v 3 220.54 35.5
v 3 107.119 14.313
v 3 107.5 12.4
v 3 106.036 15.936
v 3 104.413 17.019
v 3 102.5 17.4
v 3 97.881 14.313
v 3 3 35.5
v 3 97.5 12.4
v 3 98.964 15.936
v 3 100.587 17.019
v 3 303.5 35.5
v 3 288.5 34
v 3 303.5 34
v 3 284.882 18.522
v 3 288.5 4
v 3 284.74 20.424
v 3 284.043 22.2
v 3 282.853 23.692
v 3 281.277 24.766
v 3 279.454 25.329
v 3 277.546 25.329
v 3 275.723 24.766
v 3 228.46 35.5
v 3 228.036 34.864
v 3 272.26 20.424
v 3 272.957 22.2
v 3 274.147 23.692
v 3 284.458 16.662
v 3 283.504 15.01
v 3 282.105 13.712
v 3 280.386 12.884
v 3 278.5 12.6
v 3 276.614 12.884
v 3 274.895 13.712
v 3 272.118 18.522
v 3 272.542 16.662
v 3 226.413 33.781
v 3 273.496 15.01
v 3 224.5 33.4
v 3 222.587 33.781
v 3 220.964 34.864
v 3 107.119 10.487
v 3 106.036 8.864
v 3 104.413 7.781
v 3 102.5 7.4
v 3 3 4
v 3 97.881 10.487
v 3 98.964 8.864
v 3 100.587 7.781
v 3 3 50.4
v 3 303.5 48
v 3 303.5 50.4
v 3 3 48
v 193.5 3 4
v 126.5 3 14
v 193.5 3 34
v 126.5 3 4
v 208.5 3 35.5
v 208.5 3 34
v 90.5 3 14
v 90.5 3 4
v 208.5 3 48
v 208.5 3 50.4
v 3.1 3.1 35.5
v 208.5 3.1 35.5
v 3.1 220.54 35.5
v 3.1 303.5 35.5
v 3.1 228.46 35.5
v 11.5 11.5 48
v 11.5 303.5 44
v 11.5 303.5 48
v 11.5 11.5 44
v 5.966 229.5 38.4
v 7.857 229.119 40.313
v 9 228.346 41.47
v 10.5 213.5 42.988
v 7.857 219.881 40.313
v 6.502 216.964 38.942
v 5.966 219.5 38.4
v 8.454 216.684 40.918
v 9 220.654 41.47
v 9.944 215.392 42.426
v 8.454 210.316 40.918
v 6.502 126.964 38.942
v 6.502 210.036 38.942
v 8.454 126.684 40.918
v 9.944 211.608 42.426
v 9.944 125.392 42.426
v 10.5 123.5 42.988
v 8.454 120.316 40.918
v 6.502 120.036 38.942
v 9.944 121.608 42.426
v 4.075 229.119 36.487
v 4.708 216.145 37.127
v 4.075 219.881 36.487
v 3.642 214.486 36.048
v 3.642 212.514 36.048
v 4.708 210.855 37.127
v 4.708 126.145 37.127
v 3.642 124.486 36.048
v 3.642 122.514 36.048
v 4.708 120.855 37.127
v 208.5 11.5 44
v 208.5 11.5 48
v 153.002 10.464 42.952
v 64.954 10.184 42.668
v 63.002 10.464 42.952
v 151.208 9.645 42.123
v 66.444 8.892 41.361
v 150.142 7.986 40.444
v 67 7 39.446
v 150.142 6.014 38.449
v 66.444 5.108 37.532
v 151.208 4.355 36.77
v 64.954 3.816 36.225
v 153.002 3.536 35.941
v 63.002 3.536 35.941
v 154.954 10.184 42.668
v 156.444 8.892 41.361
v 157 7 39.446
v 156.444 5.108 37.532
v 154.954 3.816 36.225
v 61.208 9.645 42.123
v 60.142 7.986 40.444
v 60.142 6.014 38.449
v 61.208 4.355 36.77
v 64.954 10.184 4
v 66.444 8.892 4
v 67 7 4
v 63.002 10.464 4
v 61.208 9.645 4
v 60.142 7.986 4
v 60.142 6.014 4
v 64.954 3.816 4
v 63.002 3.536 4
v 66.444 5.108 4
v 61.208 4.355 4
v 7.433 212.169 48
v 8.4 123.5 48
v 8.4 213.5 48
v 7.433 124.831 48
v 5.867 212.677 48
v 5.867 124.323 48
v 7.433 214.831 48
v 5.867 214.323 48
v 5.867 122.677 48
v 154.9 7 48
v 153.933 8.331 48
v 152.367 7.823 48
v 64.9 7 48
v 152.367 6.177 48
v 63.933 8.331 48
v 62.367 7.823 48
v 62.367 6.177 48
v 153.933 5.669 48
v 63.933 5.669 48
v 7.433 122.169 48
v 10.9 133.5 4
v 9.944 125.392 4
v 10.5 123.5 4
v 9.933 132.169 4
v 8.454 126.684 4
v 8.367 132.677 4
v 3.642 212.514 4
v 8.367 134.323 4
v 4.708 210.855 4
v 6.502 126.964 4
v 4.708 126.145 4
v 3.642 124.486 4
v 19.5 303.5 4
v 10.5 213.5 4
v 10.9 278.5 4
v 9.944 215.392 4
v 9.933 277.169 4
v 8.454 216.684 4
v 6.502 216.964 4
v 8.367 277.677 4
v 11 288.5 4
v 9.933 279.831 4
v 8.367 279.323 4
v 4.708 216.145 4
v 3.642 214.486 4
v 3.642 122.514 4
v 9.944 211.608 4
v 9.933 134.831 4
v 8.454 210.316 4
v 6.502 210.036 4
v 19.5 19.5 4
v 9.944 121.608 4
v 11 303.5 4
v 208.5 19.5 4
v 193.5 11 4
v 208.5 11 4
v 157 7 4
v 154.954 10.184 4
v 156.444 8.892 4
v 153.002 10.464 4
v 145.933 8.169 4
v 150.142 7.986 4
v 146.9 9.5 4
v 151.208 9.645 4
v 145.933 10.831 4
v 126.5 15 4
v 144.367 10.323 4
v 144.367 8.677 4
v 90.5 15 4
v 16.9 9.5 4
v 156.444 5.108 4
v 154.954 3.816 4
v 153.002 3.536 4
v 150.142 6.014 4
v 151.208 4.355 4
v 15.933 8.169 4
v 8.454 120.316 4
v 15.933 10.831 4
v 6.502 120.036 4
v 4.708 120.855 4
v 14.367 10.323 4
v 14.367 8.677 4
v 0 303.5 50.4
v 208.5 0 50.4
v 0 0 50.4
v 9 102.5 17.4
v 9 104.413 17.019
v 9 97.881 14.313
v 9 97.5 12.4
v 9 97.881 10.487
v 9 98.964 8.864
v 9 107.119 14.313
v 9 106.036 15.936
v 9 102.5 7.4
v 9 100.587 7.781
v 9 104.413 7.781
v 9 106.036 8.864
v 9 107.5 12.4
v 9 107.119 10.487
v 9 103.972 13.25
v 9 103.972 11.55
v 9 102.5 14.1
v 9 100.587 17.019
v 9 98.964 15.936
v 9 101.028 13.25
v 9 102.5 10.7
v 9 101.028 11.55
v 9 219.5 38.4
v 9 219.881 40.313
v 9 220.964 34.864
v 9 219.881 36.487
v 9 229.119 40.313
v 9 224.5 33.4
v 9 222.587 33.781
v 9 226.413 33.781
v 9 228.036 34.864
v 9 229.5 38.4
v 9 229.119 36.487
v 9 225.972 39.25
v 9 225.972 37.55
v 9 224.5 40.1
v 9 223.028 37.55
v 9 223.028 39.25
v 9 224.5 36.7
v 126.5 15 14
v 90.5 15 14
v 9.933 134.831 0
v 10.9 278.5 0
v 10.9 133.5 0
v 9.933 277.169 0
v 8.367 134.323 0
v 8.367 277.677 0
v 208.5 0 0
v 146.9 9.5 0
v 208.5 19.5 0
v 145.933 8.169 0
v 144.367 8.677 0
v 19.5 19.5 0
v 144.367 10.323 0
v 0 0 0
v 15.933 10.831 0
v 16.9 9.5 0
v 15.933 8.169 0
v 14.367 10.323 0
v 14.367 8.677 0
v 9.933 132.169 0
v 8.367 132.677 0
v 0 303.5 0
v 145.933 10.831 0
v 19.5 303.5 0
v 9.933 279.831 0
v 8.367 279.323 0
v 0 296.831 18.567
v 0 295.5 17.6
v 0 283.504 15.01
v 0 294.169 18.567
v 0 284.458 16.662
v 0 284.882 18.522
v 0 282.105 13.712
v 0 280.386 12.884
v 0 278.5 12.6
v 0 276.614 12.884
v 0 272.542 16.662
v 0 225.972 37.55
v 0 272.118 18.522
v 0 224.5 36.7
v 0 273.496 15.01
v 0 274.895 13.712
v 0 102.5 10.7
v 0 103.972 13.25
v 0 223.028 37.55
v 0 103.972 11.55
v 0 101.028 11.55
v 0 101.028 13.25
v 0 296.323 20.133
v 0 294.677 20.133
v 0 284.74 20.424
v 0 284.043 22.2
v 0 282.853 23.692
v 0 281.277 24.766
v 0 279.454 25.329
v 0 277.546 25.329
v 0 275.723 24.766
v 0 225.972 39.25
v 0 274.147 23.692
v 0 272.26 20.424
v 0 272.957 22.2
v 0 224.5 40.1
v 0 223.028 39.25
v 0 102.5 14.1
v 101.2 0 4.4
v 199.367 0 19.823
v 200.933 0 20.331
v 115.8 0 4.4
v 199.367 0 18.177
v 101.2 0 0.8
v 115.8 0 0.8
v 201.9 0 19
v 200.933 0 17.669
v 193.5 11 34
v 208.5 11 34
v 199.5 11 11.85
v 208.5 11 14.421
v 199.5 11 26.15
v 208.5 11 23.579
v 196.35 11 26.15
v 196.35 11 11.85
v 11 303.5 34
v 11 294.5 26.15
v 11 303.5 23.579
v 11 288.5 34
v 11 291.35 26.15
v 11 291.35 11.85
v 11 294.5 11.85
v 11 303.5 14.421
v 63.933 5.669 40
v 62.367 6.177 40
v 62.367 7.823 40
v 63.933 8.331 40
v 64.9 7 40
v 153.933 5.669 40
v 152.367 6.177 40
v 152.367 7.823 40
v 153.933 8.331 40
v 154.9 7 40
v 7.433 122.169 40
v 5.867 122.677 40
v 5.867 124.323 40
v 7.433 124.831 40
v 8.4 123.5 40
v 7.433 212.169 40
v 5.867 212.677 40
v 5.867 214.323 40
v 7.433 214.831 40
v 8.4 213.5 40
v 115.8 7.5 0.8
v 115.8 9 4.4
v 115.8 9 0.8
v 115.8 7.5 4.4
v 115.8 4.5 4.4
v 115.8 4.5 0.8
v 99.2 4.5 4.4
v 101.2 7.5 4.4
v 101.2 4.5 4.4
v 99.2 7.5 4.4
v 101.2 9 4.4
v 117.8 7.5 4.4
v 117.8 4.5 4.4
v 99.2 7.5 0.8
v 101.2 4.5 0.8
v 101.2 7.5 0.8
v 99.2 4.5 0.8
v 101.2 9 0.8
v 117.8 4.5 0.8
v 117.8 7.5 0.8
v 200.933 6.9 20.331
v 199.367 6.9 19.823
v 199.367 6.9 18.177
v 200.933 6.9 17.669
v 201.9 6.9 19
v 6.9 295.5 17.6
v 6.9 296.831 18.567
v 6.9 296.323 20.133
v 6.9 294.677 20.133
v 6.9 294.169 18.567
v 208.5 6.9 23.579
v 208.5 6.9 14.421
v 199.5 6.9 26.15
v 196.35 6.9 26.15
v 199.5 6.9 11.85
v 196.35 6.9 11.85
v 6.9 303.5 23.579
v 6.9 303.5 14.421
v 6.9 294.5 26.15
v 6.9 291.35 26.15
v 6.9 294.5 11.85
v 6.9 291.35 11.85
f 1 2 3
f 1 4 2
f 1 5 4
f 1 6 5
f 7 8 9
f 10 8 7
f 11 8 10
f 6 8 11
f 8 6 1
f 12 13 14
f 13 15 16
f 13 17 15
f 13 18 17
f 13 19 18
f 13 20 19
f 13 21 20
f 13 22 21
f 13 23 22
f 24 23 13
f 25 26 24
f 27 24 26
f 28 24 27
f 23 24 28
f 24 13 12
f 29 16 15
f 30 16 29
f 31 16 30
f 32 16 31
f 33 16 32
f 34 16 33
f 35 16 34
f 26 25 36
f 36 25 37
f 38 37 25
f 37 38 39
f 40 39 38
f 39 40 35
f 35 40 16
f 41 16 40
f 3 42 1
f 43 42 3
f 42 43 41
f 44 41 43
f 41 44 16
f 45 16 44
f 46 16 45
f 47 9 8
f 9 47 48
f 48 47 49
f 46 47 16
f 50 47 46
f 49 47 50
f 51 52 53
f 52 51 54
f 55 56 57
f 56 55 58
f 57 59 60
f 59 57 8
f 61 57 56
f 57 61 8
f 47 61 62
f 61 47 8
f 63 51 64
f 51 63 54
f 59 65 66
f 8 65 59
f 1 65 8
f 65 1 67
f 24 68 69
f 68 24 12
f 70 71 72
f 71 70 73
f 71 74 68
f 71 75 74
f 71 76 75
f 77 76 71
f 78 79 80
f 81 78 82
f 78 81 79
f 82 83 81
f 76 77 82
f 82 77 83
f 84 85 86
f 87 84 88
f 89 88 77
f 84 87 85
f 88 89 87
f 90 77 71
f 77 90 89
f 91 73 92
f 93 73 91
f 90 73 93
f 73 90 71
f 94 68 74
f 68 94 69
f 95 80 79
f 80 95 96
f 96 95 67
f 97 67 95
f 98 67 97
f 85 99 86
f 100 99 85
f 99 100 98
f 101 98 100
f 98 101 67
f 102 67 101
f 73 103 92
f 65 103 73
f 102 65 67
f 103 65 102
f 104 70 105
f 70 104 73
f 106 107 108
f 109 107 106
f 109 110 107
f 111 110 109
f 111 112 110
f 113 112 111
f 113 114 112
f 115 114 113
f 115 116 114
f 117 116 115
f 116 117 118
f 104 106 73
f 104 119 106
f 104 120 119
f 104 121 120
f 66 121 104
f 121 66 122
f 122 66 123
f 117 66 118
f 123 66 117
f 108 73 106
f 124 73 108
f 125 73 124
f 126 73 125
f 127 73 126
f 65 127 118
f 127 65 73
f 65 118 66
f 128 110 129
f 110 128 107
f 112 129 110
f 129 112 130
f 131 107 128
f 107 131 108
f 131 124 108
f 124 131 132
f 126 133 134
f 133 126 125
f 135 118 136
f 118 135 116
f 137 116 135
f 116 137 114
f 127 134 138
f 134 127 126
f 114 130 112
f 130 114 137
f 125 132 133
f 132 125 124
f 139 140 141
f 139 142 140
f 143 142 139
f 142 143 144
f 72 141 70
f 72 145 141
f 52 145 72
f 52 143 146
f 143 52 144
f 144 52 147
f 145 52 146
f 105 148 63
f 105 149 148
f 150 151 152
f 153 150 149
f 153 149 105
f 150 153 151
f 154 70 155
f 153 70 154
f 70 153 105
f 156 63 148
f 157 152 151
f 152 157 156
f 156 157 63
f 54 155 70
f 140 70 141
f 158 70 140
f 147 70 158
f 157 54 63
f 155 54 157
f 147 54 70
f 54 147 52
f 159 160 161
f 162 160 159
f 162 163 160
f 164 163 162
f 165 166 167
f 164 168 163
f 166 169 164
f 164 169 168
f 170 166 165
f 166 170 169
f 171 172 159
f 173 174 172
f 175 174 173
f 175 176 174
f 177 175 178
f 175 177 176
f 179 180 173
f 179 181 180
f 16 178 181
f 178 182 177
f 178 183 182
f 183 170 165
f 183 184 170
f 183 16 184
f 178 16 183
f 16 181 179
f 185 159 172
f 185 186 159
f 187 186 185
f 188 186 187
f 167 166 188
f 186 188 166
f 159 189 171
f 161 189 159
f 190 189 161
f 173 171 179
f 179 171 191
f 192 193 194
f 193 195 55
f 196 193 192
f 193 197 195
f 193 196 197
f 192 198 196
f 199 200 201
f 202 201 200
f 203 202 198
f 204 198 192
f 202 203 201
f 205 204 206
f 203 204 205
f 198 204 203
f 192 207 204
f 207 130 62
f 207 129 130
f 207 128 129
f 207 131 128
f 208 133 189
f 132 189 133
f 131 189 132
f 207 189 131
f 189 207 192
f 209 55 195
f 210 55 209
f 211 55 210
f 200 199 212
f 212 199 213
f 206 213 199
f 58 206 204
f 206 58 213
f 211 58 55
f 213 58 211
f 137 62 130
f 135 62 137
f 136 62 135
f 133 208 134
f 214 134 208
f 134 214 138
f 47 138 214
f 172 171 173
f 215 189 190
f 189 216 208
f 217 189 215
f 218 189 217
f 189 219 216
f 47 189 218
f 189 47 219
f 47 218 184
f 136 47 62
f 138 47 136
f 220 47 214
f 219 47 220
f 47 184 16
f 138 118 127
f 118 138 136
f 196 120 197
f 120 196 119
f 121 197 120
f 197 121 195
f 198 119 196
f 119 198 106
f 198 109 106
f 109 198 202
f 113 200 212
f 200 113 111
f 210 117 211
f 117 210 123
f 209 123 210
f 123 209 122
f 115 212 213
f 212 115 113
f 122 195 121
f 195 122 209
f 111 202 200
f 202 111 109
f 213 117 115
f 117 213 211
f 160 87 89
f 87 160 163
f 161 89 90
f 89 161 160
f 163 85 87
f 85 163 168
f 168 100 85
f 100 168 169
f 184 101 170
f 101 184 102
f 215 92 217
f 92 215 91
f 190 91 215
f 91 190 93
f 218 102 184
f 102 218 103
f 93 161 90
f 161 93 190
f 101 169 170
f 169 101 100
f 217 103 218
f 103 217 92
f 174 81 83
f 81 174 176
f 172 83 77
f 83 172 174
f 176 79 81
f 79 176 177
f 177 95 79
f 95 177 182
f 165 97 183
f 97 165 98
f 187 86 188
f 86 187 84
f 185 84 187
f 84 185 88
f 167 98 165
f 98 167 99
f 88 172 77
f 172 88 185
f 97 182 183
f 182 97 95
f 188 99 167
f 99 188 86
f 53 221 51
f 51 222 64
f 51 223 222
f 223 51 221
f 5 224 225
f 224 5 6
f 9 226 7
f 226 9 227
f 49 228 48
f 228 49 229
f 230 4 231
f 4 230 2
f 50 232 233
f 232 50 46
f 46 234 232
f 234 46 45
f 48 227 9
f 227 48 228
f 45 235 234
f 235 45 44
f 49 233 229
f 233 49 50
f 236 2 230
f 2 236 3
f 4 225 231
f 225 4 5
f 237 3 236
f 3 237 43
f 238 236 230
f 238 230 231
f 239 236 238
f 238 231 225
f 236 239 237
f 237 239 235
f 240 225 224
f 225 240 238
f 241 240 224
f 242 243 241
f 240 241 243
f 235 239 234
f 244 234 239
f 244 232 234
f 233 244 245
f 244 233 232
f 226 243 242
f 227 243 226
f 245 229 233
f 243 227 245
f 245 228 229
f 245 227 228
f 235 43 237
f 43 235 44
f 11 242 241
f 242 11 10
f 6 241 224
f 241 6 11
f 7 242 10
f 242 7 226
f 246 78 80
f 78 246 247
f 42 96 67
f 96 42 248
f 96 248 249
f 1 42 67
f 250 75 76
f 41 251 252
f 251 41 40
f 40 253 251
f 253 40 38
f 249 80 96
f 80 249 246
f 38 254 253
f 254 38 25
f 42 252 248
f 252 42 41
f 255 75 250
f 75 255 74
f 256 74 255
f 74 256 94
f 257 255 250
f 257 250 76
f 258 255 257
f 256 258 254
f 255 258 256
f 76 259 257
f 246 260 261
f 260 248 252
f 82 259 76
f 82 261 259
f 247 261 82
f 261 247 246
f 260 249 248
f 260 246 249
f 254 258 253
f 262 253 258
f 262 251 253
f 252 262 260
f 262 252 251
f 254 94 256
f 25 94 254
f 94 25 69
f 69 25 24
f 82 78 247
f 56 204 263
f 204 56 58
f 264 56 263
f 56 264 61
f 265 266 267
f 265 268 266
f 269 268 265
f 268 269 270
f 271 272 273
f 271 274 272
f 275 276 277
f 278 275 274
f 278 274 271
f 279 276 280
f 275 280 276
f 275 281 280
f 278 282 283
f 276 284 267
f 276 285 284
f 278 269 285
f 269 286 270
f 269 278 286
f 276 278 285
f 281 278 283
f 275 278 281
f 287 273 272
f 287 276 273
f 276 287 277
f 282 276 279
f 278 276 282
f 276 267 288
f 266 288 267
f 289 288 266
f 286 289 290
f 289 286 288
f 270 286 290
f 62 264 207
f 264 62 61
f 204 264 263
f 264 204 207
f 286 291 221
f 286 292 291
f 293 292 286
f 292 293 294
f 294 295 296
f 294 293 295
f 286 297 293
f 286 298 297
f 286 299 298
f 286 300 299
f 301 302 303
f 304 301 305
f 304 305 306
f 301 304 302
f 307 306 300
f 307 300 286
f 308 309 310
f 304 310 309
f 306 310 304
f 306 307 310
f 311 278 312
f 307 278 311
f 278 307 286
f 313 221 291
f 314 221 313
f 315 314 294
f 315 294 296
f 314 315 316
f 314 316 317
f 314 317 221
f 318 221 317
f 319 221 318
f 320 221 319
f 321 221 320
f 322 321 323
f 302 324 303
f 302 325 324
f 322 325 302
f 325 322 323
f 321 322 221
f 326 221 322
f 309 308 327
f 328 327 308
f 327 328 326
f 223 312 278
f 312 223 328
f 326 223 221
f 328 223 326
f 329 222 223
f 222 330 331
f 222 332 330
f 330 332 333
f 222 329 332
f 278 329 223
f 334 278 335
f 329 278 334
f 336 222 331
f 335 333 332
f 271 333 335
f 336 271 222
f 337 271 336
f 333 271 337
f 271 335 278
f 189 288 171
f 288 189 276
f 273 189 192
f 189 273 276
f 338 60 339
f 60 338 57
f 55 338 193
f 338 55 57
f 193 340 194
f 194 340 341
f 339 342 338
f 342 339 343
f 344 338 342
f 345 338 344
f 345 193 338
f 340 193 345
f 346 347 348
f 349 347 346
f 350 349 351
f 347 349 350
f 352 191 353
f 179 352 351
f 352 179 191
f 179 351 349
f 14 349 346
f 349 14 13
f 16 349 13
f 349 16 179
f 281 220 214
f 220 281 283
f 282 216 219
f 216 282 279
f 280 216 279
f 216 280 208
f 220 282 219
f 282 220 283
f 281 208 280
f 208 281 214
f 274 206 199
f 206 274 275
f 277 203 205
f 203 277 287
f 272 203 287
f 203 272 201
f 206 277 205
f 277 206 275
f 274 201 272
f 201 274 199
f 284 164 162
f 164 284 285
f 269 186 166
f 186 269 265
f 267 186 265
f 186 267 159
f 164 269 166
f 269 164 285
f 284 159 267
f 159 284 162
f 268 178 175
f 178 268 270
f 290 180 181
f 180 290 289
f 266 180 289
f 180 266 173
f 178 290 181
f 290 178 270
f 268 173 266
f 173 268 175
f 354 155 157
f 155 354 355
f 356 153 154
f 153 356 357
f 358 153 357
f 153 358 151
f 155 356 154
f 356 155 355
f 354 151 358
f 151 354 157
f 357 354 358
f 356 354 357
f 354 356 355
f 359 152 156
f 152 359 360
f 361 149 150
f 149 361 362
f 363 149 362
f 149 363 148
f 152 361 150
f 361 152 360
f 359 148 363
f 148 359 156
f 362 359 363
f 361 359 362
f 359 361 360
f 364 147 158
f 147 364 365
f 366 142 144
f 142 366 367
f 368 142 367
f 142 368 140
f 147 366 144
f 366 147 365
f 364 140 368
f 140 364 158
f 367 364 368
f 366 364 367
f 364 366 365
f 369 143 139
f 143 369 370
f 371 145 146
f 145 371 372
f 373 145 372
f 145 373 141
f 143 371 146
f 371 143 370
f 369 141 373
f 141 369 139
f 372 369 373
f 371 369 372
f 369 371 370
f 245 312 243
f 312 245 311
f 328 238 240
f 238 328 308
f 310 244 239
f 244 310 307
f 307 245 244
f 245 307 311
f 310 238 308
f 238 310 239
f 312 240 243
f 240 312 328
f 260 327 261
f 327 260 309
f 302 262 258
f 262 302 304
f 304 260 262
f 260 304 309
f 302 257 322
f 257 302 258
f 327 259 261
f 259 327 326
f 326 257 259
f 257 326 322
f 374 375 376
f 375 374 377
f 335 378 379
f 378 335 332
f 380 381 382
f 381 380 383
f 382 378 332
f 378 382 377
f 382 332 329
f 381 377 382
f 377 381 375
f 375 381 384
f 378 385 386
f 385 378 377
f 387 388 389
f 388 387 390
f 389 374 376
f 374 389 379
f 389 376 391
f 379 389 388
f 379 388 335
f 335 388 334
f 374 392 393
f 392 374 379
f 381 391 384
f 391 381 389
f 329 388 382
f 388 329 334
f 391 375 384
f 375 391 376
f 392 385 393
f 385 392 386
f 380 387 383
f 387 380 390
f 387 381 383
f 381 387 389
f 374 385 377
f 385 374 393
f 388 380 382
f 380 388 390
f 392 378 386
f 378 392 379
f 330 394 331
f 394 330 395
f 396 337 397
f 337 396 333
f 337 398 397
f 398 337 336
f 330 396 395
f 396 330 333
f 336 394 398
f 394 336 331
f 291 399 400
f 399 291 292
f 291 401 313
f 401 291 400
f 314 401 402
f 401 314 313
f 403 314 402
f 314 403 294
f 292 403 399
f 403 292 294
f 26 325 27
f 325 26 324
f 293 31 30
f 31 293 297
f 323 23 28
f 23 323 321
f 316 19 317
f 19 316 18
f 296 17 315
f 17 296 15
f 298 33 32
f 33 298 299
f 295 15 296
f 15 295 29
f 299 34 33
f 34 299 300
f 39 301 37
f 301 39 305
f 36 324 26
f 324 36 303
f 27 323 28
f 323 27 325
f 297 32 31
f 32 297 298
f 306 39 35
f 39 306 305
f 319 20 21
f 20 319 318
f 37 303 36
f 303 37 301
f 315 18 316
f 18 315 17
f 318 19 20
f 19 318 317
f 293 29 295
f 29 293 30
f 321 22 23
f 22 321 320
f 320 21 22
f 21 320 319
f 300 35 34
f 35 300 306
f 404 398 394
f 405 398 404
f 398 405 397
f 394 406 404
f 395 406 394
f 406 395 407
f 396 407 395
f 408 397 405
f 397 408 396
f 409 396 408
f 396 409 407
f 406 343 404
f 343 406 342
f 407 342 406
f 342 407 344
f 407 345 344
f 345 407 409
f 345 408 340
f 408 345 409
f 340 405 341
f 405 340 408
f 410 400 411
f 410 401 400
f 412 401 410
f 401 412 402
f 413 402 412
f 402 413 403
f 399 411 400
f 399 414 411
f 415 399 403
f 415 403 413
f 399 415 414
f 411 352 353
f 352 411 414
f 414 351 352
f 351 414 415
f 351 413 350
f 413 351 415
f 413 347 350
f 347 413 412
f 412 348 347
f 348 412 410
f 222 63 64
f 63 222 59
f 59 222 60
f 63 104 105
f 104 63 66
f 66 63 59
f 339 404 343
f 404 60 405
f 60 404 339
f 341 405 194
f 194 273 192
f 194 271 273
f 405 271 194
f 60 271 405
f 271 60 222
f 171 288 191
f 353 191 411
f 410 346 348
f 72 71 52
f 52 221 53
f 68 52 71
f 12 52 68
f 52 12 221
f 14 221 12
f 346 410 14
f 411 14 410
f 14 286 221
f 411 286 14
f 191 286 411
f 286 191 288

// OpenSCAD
// file: frame_layout.scad
// AUTO-GENERATED by tools/boltframe.py — backer frame layout
// Board coords, z=0 at plate BACK, +z into the cavity.
fr_face=[410.0,550.0]; fr_clr=0.5; fr_wall=3.0; fr_cavity=48.0;
fr_panel_t=2.4; fr_flange_w=16.0; fr_flange_t=4.0;
fr_ledge_w=8.0; fr_ledge_t=4.0; fr_reveal=2.0;
fr_joint=[205.0,300.0];
fr_boss=[[12.00,6.00],[142.00,6.00],[272.00,6.00],[398.00,6.00],[12.00,544.00],[142.00,544.00],[272.00,544.00],[398.00,544.00],[6.00,130.00],[6.00,275.00],[6.00,420.00],[404.00,130.00],[404.00,275.00],[404.00,420.00]];
fr_panels=[[0.0,0.0,205.0,300.0],[205.0,0.0,410.0,300.0],[0.0,300.0,205.0,550.0],[205.0,300.0,410.0,550.0]];
fr_panel_scr=[[[60.00,3.50],[150.00,3.50],[3.50,120.00],[3.50,210.00],[131.50,60.00],[131.50,130.00],[174.50,60.00],[174.50,130.00],[40.00,255.00]],[[260.00,3.50],[350.00,3.50],[406.50,120.00],[406.50,210.00],[280.00,255.00],[370.00,255.00]],[[60.00,546.50],[150.00,546.50],[3.50,340.00],[3.50,395.00],[104.50,330.00],[104.50,470.00],[147.50,330.00],[147.50,470.00]],[[220.00,546.50],[260.00,546.50],[350.00,546.50],[406.50,340.00],[406.50,470.00],[406.50,530.00]]];
fr_ledge_boss=[[60.00,3.50],[150.00,3.50],[260.00,3.50],[350.00,3.50],[60.00,546.50],[150.00,546.50],[220.00,546.50],[260.00,546.50],[350.00,546.50],[3.50,120.00],[3.50,210.00],[3.50,340.00],[3.50,395.00],[406.50,120.00],[406.50,210.00],[406.50,340.00],[406.50,470.00],[406.50,530.00]];
fr_rail_boss=[[104.50,330.00],[104.50,470.00],[147.50,330.00],[147.50,470.00],[131.50,60.00],[131.50,130.00],[174.50,60.00],[174.50,130.00]];
fr_leg=[[40.00,255.00],[280.00,255.00],[370.00,255.00]];
fr_tray_psu=[1.0,407.0,98.0,536.0];
fr_psu_holes=[[35.00,485.00],[68.00,485.00]];
fr_psu_slots=[[41.50,427.50,46.50,427.50],[41.50,482.50,46.50,482.50]];
fr_tray_ctl=[342.0,405.0,392.0,534.0];
fr_ctl_holes=[[354.00,408.50],[380.00,530.50]];
fr_ctl_ext=[[99.00,12.40],[221.00,38.40]];
fr_gland=[275.0,19.0];
fr_gland_plate=0;
fr_trim=0;
fr_handle=[[60.0,150.0,65.0,145.0],[260.0,350.0,265.0,345.0]];
fr_feet=[105.0,305.0];
fr_vent_intake=[14, 23, 32, 41, 50];
fr_vent_exhaust=[500, 509, 518, 527, 536];
fr_mic=[367.0,470.0];
// main file
// Backer-frame corner-L rail segments (spec 2026-07-21). WHITE PETG.
//   openscad -D SEG=<1|2|3|4> -o frame_segN.stl src/parts/frame.scad
//   SEG: 1=bottom-left 2=bottom-right 3=top-right 4=top-left
// Board coords, z=0 = plate BACK, +z into the cavity. Prints FLANGE-DOWN
// (flange + tray floors on the bed); the 2 mm reveal is a snap-on trim
// strip (frame_parts PART=6), not part of this body.
include <frame_layout.scad>

SEG = 1;

ox0 = -fr_clr - fr_wall;  ox1 = fr_face[0] + fr_clr + fr_wall;
oy0 = -fr_clr - fr_wall;  oy1 = fr_face[1] + fr_clr + fr_wall;
inx0 = ox0 + fr_wall;  inx1 = ox1 - fr_wall;   // wall inner faces (-0.5 / +.5)
iny0 = oy0 + fr_wall;  iny1 = oy1 - fr_wall;
wz1 = fr_cavity + fr_panel_t;            // wall top (38.4) = panel back plane
lz0 = fr_cavity - fr_ledge_t;            // ledge underside (32)
chw = fr_ledge_w + fr_clr;               // chamfer reach inboard of the wall

module oring(w) difference() {           // perimeter band, width w inboard
    translate([ox0, oy0]) square([ox1 - ox0, oy1 - oy0]);
    translate([ox0 + w, oy0 + w]) square([ox1 - ox0 - 2*w, oy1 - oy0 - 2*w]);
}

// 45-degree support wedge under the ledge ring (per side, corners overlap):
// hull of a hairline strip on the wall inner face (z lz0-chw) and the
// ledge-width strip at the ledge underside (z lz0)
module ledge_chamfer() {
    hull() {  // left
        translate([inx0, iny0, lz0 - chw]) cube([0.1, iny1 - iny0, 0.1]);
        translate([inx0, iny0, lz0]) cube([chw, iny1 - iny0, 0.1]);
    }
    hull() {  // right
        translate([inx1 - 0.1, iny0, lz0 - chw]) cube([0.1, iny1 - iny0, 0.1]);
        translate([inx1 - chw, iny0, lz0]) cube([chw, iny1 - iny0, 0.1]);
    }
    hull() {  // bottom
        translate([inx0, iny0, lz0 - chw]) cube([inx1 - inx0, 0.1, 0.1]);
        translate([inx0, iny0, lz0]) cube([inx1 - inx0, chw, 0.1]);
    }
    hull() {  // top
        translate([inx0, iny1 - 0.1, lz0 - chw]) cube([inx1 - inx0, 0.1, 0.1]);
        translate([inx0, iny1 - chw, lz0]) cube([inx1 - inx0, chw, 0.1]);
    }
}

module body() {
    linear_extrude(wz1) oring(fr_wall);                  // walls
    linear_extrude(fr_flange_t)
        oring(fr_wall + fr_clr + fr_flange_w);           // flange
    translate([0, 0, lz0]) linear_extrude(fr_ledge_t)
        oring(fr_wall + fr_clr + fr_ledge_w);            // panel ledge
    ledge_chamfer();
    // equipment tray floors (merge into wall + flange; z 0..flange_t)
    translate([inx0, fr_tray_psu[1], 0])
        cube([fr_tray_psu[2] - inx0, fr_tray_psu[3] - fr_tray_psu[1],
              fr_flange_t]);
    translate([fr_tray_ctl[0], fr_tray_ctl[1], 0])
        cube([inx1 - fr_tray_ctl[0], fr_tray_ctl[3] - fr_tray_ctl[1],
              fr_flange_t]);
    // ledge-boss columns (rise from flange to ledge, pilots cut later)
    for (q = fr_ledge_boss)
        translate([q[0], q[1], fr_flange_t])
            cylinder(h = fr_cavity - fr_flange_t, d = 7);
    // handle pads under the top face, gland pilot pads, exterior ctl pads
    for (h = fr_handle) for (bx = [h[2], h[3]])
        translate([bx - 10, iny1 - 12, wz1 - 12]) cube([20, 12, 12]);
    if (fr_gland_plate)
        for (gy = [fr_gland[0] - 20, fr_gland[0] + 20])
            translate([inx0, gy, fr_gland[1]]) rotate([0, 90, 0])
                cylinder(h = 6, d = 7);
    for (q = fr_ctl_ext)
        translate([inx0, q[0], q[1]]) rotate([0, 90, 0])
            cylinder(h = 6, d = 10);
    // feet pads on the bottom wall inner face
    for (fx = fr_feet)
        translate([fx - 18, iny0 - 0.1, 0]) cube([36, 12.1, 14]);
    // dovetail joint pads (inner face, spanning each segment boundary)
    translate([fr_joint[0] - 15, iny0 - 0.1, 4]) cube([30, 8.1, 30]);
    translate([fr_joint[0] - 15, iny1 - 8, 4]) cube([30, 8.1, 30]);
    translate([inx0 - 0.1, fr_joint[1] - 15, 4]) cube([8.1, 30, 30]);
    translate([inx1 - 8, fr_joint[1] - 15, 4]) cube([8.1, 30, 30]);
}

module bowtie(cl = 0) {                   // dovetail key outline
    hull() { translate([-12 - cl, -7 - cl]) square([3 + cl, 14 + 2*cl]);
             translate([-1.5, -4 - cl]) square([3, 8 + 2*cl]); }
    hull() { translate([9, -7 - cl]) square([3 + cl, 14 + 2*cl]);
             translate([-1.5, -4 - cl]) square([3, 8 + 2*cl]); }
}

module cuts() {
    for (q = fr_boss)                     // 14 reused plate screws (pilots)
        translate([q[0], q[1], -0.1]) cylinder(h = fr_flange_t + 0.2, d = 2.8);
    for (q = fr_ledge_boss)               // panel screws into ledge bosses
        translate([q[0], q[1], fr_cavity - 8]) cylinder(h = 8.2, d = 2.8);
    for (q = fr_psu_holes)                // LRS-100 rounds (M3, 3 mm max in)
        translate([q[0], q[1], -0.1]) cylinder(h = fr_flange_t + 0.2, d = 2.8);
    for (s = fr_psu_slots)                // LRS-50/75 shared slots
        translate([0, 0, -0.1]) linear_extrude(fr_flange_t + 0.2) hull() {
            translate([s[0], s[1]]) circle(d = 2.8);
            translate([s[2], s[3]]) circle(d = 2.8);
        }
    for (q = fr_ctl_holes)                // Elite shell end screws
        translate([q[0], q[1], -0.1]) cylinder(h = fr_flange_t + 0.2, d = 3.2);
    // gland: v1 = PG7 threaded straight into the 3.0 wall (Ø12.5 hole,
    // clamp limit 3.5); plate mode = outer recess + opening + 2 pilots
    if (fr_gland_plate) {
        translate([ox0 - 0.1, fr_gland[0] - 22.5, fr_gland[1] - 15])
            cube([1.6, 45, 30]);
        translate([ox0 - 0.1, fr_gland[0] - 18, fr_gland[1] - 11])
            cube([fr_wall + 6.2, 36, 22]);
        for (gy = [fr_gland[0] - 20, fr_gland[0] + 20])
            translate([ox0 - 0.1, gy, fr_gland[1]]) rotate([0, 90, 0])
                cylinder(h = fr_wall + 6.2, d = 2.8);
    } else
        translate([ox0 - 0.1, fr_gland[0], fr_gland[1]]) rotate([0, 90, 0])
            cylinder(h = fr_wall + 0.2, d = 12.8);  // +0.3 print allowance
    for (q = fr_ctl_ext)                  // exterior controller pilots
        translate([ox0 - 0.1, q[0], q[1]]) rotate([0, 90, 0])
            cylinder(h = fr_wall + 6.2, d = 3.4);
    for (h = fr_handle) for (bx = [h[2], h[3]])   // handle bolts: down (-y),
        translate([bx, oy1 + 0.1, wz1 - 7.5]) rotate([90, 0, 0])
            cylinder(h = fr_wall + 14.2, d = 3.4);  // 7.5 off the back plane
            // = the handle's mid-thickness -> back face lands flush
    for (fx = fr_feet) {                  // feet snap sockets, entered below:
        translate([fx - 7.3, oy0 - 0.1, 0.8])             // prong channel
            cube([14.6, fr_wall + 6.1, 3.6]);
        translate([fx - 9.3, iny0 + 1.5, 0.8])            // barb pocket
            cube([18.6, 3.0, 3.6]);
    }
    // dovetail pockets open at the pad inner faces + cross-screw pilots
    translate([fr_joint[0], iny0 + 8 + 0.1, 19]) rotate([90, 0, 0])
        linear_extrude(4.2) bowtie(0.15);
    translate([fr_joint[0], iny1 - 8 + 4.1, 19]) rotate([90, 0, 0])
        linear_extrude(4.2) bowtie(0.15);
    // side pockets: extrusion must run INTO the pads (rotate [90,0,90]
    // extrudes +x — that cut air on the left; caught on the seg1 slice)
    translate([inx0 + 8 + 0.1, fr_joint[1], 19]) rotate([90, 0, -90])
        linear_extrude(4.2) bowtie(0.15);
    translate([inx1 - 8 - 0.1, fr_joint[1], 19]) rotate([90, 0, 90])
        linear_extrude(4.2) bowtie(0.15);
    for (jx = [fr_joint[0] - 8, fr_joint[0] + 8]) {
        translate([jx, oy0 - 0.1, 19]) rotate([-90, 0, 0])
            cylinder(h = fr_wall + 8.2, d = 2.8);
        translate([jx, oy1 + 0.1, 19]) rotate([90, 0, 0])
            cylinder(h = fr_wall + 8.2, d = 2.8);
    }
    for (jy = [fr_joint[1] - 8, fr_joint[1] + 8]) {
        translate([ox0 - 0.1, jy, 19]) rotate([0, 90, 0])
            cylinder(h = fr_wall + 8.2, d = 2.8);
        translate([ox1 + 0.1, jy, 19]) rotate([0, -90, 0])
            cylinder(h = fr_wall + 8.2, d = 2.8);
    }
    // trim snap groove (only when trim strips are in use)
    if (fr_trim) translate([0, 0, 5.5]) linear_extrude(2) difference() {
        translate([ox0 - 0.01, oy0 - 0.01])
            square([ox1 - ox0 + 0.02, oy1 - oy0 + 0.02]);
        translate([ox0 + 0.8, oy0 + 0.8])
            square([ox1 - ox0 - 1.6, oy1 - oy0 - 1.6]);
    }
}

clipx = [[ox0, fr_joint[0]], [fr_joint[0], ox1],
         [fr_joint[0], ox1], [ox0, fr_joint[0]]][SEG - 1];
clipy = [[oy0, fr_joint[1]], [oy0, fr_joint[1]],
         [fr_joint[1], oy1], [fr_joint[1], oy1]][SEG - 1];

translate([-clipx[0], -clipy[0], 0]) intersection() {
    difference() { body(); cuts(); }
    translate([clipx[0], clipy[0], -1])
        cube([clipx[1] - clipx[0], clipy[1] - clipy[0], wz1 + 2]);
}
